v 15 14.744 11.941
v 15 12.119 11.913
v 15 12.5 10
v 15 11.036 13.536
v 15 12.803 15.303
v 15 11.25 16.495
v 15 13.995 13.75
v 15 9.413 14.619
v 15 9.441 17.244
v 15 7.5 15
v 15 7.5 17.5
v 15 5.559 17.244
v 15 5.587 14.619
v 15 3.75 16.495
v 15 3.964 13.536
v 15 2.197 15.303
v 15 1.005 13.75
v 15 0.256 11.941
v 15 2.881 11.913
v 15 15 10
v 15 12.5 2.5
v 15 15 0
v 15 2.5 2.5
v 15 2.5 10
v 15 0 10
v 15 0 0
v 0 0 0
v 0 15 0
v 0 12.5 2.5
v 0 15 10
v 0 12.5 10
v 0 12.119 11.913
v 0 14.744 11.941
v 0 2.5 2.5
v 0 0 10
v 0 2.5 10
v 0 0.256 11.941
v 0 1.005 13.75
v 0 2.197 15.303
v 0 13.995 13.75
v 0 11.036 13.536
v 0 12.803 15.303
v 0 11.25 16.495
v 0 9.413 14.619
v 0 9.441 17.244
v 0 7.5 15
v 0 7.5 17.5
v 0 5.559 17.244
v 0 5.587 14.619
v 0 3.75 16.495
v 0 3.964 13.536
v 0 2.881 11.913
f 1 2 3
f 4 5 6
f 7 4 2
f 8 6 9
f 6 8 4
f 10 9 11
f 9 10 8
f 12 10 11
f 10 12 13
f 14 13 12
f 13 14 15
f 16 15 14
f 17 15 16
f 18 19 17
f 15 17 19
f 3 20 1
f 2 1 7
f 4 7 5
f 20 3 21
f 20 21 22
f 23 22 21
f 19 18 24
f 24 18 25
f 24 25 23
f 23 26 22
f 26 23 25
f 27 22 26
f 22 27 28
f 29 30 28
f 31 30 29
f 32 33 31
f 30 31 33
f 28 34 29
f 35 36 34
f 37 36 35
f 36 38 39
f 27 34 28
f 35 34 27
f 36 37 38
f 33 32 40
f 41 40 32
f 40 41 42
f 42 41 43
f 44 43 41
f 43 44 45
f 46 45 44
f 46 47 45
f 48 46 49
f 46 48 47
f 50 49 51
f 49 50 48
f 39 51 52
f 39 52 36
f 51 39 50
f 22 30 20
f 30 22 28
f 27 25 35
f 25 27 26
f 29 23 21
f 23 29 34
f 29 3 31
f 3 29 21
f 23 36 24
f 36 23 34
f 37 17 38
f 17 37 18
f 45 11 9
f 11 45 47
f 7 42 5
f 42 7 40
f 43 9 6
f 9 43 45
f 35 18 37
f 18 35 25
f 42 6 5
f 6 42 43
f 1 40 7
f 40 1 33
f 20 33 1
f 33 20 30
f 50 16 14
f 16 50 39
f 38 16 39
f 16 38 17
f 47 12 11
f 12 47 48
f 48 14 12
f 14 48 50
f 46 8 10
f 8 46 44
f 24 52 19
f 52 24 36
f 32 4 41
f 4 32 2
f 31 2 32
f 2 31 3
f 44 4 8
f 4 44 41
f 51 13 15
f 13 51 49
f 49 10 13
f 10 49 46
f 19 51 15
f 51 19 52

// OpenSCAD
module screw_hole(radius = 1.8) {
    cylinder(h = 5, r1 = radius, r2 = radius);
}

module stud(radius = 1.5) {
    smaller_r = radius / 2;

    difference() {
        union() {
            cylinder(h = 3, r1 = radius, r2 = radius);
            translate([0, 10, 0]) cylinder(h = 3, r1 = radius, r2 = radius);
            translate([-radius, 0, 0]) cube([2 * radius, 10, 3]);
        }

        translate([0, 0, -1])   cylinder(h = 5, r1 = smaller_r, r2 = smaller_r);
        translate([0, 10, -1])  cylinder(h = 5, r1 = smaller_r, r2 = smaller_r);
        translate([-smaller_r, 0, -1]) cube([2 * smaller_r, 10, 5]);
    }
}

module ramp() {
    
}

module esc_slot() {
    cube([47, 28, 8]);
}

module shared_esc_slot() {
    difference() {
        cube([45, 31, 20.5]);
        translate([-1, 1.5, 1.5]) esc_slot();
        translate([-1, 1.5, 11]) esc_slot();
    }
}

module platform() {
    translate([0, 0, 5]) cube([100, 100,3]);
}

module rig_hook() {
    union() {
        difference() {
            cube([15, 15, 10]);
            translate([-1, 2.5, 2.5]) cube([17, 10, 8]);
        }
        
        difference() {
            translate([0, 7.5, 10]) rotate([0, 90, 0]) cylinder(15, 7.5, 7.5);
            translate([-1, 7.5, 10]) rotate([0, 90, 0]) cylinder(17, 5, 5);
            translate([-1, -1, 0]) cube([17, 16, 10]);
        }
    }
}

//stud();
//shared_esc_slot();
//platform();
rig_hook();
